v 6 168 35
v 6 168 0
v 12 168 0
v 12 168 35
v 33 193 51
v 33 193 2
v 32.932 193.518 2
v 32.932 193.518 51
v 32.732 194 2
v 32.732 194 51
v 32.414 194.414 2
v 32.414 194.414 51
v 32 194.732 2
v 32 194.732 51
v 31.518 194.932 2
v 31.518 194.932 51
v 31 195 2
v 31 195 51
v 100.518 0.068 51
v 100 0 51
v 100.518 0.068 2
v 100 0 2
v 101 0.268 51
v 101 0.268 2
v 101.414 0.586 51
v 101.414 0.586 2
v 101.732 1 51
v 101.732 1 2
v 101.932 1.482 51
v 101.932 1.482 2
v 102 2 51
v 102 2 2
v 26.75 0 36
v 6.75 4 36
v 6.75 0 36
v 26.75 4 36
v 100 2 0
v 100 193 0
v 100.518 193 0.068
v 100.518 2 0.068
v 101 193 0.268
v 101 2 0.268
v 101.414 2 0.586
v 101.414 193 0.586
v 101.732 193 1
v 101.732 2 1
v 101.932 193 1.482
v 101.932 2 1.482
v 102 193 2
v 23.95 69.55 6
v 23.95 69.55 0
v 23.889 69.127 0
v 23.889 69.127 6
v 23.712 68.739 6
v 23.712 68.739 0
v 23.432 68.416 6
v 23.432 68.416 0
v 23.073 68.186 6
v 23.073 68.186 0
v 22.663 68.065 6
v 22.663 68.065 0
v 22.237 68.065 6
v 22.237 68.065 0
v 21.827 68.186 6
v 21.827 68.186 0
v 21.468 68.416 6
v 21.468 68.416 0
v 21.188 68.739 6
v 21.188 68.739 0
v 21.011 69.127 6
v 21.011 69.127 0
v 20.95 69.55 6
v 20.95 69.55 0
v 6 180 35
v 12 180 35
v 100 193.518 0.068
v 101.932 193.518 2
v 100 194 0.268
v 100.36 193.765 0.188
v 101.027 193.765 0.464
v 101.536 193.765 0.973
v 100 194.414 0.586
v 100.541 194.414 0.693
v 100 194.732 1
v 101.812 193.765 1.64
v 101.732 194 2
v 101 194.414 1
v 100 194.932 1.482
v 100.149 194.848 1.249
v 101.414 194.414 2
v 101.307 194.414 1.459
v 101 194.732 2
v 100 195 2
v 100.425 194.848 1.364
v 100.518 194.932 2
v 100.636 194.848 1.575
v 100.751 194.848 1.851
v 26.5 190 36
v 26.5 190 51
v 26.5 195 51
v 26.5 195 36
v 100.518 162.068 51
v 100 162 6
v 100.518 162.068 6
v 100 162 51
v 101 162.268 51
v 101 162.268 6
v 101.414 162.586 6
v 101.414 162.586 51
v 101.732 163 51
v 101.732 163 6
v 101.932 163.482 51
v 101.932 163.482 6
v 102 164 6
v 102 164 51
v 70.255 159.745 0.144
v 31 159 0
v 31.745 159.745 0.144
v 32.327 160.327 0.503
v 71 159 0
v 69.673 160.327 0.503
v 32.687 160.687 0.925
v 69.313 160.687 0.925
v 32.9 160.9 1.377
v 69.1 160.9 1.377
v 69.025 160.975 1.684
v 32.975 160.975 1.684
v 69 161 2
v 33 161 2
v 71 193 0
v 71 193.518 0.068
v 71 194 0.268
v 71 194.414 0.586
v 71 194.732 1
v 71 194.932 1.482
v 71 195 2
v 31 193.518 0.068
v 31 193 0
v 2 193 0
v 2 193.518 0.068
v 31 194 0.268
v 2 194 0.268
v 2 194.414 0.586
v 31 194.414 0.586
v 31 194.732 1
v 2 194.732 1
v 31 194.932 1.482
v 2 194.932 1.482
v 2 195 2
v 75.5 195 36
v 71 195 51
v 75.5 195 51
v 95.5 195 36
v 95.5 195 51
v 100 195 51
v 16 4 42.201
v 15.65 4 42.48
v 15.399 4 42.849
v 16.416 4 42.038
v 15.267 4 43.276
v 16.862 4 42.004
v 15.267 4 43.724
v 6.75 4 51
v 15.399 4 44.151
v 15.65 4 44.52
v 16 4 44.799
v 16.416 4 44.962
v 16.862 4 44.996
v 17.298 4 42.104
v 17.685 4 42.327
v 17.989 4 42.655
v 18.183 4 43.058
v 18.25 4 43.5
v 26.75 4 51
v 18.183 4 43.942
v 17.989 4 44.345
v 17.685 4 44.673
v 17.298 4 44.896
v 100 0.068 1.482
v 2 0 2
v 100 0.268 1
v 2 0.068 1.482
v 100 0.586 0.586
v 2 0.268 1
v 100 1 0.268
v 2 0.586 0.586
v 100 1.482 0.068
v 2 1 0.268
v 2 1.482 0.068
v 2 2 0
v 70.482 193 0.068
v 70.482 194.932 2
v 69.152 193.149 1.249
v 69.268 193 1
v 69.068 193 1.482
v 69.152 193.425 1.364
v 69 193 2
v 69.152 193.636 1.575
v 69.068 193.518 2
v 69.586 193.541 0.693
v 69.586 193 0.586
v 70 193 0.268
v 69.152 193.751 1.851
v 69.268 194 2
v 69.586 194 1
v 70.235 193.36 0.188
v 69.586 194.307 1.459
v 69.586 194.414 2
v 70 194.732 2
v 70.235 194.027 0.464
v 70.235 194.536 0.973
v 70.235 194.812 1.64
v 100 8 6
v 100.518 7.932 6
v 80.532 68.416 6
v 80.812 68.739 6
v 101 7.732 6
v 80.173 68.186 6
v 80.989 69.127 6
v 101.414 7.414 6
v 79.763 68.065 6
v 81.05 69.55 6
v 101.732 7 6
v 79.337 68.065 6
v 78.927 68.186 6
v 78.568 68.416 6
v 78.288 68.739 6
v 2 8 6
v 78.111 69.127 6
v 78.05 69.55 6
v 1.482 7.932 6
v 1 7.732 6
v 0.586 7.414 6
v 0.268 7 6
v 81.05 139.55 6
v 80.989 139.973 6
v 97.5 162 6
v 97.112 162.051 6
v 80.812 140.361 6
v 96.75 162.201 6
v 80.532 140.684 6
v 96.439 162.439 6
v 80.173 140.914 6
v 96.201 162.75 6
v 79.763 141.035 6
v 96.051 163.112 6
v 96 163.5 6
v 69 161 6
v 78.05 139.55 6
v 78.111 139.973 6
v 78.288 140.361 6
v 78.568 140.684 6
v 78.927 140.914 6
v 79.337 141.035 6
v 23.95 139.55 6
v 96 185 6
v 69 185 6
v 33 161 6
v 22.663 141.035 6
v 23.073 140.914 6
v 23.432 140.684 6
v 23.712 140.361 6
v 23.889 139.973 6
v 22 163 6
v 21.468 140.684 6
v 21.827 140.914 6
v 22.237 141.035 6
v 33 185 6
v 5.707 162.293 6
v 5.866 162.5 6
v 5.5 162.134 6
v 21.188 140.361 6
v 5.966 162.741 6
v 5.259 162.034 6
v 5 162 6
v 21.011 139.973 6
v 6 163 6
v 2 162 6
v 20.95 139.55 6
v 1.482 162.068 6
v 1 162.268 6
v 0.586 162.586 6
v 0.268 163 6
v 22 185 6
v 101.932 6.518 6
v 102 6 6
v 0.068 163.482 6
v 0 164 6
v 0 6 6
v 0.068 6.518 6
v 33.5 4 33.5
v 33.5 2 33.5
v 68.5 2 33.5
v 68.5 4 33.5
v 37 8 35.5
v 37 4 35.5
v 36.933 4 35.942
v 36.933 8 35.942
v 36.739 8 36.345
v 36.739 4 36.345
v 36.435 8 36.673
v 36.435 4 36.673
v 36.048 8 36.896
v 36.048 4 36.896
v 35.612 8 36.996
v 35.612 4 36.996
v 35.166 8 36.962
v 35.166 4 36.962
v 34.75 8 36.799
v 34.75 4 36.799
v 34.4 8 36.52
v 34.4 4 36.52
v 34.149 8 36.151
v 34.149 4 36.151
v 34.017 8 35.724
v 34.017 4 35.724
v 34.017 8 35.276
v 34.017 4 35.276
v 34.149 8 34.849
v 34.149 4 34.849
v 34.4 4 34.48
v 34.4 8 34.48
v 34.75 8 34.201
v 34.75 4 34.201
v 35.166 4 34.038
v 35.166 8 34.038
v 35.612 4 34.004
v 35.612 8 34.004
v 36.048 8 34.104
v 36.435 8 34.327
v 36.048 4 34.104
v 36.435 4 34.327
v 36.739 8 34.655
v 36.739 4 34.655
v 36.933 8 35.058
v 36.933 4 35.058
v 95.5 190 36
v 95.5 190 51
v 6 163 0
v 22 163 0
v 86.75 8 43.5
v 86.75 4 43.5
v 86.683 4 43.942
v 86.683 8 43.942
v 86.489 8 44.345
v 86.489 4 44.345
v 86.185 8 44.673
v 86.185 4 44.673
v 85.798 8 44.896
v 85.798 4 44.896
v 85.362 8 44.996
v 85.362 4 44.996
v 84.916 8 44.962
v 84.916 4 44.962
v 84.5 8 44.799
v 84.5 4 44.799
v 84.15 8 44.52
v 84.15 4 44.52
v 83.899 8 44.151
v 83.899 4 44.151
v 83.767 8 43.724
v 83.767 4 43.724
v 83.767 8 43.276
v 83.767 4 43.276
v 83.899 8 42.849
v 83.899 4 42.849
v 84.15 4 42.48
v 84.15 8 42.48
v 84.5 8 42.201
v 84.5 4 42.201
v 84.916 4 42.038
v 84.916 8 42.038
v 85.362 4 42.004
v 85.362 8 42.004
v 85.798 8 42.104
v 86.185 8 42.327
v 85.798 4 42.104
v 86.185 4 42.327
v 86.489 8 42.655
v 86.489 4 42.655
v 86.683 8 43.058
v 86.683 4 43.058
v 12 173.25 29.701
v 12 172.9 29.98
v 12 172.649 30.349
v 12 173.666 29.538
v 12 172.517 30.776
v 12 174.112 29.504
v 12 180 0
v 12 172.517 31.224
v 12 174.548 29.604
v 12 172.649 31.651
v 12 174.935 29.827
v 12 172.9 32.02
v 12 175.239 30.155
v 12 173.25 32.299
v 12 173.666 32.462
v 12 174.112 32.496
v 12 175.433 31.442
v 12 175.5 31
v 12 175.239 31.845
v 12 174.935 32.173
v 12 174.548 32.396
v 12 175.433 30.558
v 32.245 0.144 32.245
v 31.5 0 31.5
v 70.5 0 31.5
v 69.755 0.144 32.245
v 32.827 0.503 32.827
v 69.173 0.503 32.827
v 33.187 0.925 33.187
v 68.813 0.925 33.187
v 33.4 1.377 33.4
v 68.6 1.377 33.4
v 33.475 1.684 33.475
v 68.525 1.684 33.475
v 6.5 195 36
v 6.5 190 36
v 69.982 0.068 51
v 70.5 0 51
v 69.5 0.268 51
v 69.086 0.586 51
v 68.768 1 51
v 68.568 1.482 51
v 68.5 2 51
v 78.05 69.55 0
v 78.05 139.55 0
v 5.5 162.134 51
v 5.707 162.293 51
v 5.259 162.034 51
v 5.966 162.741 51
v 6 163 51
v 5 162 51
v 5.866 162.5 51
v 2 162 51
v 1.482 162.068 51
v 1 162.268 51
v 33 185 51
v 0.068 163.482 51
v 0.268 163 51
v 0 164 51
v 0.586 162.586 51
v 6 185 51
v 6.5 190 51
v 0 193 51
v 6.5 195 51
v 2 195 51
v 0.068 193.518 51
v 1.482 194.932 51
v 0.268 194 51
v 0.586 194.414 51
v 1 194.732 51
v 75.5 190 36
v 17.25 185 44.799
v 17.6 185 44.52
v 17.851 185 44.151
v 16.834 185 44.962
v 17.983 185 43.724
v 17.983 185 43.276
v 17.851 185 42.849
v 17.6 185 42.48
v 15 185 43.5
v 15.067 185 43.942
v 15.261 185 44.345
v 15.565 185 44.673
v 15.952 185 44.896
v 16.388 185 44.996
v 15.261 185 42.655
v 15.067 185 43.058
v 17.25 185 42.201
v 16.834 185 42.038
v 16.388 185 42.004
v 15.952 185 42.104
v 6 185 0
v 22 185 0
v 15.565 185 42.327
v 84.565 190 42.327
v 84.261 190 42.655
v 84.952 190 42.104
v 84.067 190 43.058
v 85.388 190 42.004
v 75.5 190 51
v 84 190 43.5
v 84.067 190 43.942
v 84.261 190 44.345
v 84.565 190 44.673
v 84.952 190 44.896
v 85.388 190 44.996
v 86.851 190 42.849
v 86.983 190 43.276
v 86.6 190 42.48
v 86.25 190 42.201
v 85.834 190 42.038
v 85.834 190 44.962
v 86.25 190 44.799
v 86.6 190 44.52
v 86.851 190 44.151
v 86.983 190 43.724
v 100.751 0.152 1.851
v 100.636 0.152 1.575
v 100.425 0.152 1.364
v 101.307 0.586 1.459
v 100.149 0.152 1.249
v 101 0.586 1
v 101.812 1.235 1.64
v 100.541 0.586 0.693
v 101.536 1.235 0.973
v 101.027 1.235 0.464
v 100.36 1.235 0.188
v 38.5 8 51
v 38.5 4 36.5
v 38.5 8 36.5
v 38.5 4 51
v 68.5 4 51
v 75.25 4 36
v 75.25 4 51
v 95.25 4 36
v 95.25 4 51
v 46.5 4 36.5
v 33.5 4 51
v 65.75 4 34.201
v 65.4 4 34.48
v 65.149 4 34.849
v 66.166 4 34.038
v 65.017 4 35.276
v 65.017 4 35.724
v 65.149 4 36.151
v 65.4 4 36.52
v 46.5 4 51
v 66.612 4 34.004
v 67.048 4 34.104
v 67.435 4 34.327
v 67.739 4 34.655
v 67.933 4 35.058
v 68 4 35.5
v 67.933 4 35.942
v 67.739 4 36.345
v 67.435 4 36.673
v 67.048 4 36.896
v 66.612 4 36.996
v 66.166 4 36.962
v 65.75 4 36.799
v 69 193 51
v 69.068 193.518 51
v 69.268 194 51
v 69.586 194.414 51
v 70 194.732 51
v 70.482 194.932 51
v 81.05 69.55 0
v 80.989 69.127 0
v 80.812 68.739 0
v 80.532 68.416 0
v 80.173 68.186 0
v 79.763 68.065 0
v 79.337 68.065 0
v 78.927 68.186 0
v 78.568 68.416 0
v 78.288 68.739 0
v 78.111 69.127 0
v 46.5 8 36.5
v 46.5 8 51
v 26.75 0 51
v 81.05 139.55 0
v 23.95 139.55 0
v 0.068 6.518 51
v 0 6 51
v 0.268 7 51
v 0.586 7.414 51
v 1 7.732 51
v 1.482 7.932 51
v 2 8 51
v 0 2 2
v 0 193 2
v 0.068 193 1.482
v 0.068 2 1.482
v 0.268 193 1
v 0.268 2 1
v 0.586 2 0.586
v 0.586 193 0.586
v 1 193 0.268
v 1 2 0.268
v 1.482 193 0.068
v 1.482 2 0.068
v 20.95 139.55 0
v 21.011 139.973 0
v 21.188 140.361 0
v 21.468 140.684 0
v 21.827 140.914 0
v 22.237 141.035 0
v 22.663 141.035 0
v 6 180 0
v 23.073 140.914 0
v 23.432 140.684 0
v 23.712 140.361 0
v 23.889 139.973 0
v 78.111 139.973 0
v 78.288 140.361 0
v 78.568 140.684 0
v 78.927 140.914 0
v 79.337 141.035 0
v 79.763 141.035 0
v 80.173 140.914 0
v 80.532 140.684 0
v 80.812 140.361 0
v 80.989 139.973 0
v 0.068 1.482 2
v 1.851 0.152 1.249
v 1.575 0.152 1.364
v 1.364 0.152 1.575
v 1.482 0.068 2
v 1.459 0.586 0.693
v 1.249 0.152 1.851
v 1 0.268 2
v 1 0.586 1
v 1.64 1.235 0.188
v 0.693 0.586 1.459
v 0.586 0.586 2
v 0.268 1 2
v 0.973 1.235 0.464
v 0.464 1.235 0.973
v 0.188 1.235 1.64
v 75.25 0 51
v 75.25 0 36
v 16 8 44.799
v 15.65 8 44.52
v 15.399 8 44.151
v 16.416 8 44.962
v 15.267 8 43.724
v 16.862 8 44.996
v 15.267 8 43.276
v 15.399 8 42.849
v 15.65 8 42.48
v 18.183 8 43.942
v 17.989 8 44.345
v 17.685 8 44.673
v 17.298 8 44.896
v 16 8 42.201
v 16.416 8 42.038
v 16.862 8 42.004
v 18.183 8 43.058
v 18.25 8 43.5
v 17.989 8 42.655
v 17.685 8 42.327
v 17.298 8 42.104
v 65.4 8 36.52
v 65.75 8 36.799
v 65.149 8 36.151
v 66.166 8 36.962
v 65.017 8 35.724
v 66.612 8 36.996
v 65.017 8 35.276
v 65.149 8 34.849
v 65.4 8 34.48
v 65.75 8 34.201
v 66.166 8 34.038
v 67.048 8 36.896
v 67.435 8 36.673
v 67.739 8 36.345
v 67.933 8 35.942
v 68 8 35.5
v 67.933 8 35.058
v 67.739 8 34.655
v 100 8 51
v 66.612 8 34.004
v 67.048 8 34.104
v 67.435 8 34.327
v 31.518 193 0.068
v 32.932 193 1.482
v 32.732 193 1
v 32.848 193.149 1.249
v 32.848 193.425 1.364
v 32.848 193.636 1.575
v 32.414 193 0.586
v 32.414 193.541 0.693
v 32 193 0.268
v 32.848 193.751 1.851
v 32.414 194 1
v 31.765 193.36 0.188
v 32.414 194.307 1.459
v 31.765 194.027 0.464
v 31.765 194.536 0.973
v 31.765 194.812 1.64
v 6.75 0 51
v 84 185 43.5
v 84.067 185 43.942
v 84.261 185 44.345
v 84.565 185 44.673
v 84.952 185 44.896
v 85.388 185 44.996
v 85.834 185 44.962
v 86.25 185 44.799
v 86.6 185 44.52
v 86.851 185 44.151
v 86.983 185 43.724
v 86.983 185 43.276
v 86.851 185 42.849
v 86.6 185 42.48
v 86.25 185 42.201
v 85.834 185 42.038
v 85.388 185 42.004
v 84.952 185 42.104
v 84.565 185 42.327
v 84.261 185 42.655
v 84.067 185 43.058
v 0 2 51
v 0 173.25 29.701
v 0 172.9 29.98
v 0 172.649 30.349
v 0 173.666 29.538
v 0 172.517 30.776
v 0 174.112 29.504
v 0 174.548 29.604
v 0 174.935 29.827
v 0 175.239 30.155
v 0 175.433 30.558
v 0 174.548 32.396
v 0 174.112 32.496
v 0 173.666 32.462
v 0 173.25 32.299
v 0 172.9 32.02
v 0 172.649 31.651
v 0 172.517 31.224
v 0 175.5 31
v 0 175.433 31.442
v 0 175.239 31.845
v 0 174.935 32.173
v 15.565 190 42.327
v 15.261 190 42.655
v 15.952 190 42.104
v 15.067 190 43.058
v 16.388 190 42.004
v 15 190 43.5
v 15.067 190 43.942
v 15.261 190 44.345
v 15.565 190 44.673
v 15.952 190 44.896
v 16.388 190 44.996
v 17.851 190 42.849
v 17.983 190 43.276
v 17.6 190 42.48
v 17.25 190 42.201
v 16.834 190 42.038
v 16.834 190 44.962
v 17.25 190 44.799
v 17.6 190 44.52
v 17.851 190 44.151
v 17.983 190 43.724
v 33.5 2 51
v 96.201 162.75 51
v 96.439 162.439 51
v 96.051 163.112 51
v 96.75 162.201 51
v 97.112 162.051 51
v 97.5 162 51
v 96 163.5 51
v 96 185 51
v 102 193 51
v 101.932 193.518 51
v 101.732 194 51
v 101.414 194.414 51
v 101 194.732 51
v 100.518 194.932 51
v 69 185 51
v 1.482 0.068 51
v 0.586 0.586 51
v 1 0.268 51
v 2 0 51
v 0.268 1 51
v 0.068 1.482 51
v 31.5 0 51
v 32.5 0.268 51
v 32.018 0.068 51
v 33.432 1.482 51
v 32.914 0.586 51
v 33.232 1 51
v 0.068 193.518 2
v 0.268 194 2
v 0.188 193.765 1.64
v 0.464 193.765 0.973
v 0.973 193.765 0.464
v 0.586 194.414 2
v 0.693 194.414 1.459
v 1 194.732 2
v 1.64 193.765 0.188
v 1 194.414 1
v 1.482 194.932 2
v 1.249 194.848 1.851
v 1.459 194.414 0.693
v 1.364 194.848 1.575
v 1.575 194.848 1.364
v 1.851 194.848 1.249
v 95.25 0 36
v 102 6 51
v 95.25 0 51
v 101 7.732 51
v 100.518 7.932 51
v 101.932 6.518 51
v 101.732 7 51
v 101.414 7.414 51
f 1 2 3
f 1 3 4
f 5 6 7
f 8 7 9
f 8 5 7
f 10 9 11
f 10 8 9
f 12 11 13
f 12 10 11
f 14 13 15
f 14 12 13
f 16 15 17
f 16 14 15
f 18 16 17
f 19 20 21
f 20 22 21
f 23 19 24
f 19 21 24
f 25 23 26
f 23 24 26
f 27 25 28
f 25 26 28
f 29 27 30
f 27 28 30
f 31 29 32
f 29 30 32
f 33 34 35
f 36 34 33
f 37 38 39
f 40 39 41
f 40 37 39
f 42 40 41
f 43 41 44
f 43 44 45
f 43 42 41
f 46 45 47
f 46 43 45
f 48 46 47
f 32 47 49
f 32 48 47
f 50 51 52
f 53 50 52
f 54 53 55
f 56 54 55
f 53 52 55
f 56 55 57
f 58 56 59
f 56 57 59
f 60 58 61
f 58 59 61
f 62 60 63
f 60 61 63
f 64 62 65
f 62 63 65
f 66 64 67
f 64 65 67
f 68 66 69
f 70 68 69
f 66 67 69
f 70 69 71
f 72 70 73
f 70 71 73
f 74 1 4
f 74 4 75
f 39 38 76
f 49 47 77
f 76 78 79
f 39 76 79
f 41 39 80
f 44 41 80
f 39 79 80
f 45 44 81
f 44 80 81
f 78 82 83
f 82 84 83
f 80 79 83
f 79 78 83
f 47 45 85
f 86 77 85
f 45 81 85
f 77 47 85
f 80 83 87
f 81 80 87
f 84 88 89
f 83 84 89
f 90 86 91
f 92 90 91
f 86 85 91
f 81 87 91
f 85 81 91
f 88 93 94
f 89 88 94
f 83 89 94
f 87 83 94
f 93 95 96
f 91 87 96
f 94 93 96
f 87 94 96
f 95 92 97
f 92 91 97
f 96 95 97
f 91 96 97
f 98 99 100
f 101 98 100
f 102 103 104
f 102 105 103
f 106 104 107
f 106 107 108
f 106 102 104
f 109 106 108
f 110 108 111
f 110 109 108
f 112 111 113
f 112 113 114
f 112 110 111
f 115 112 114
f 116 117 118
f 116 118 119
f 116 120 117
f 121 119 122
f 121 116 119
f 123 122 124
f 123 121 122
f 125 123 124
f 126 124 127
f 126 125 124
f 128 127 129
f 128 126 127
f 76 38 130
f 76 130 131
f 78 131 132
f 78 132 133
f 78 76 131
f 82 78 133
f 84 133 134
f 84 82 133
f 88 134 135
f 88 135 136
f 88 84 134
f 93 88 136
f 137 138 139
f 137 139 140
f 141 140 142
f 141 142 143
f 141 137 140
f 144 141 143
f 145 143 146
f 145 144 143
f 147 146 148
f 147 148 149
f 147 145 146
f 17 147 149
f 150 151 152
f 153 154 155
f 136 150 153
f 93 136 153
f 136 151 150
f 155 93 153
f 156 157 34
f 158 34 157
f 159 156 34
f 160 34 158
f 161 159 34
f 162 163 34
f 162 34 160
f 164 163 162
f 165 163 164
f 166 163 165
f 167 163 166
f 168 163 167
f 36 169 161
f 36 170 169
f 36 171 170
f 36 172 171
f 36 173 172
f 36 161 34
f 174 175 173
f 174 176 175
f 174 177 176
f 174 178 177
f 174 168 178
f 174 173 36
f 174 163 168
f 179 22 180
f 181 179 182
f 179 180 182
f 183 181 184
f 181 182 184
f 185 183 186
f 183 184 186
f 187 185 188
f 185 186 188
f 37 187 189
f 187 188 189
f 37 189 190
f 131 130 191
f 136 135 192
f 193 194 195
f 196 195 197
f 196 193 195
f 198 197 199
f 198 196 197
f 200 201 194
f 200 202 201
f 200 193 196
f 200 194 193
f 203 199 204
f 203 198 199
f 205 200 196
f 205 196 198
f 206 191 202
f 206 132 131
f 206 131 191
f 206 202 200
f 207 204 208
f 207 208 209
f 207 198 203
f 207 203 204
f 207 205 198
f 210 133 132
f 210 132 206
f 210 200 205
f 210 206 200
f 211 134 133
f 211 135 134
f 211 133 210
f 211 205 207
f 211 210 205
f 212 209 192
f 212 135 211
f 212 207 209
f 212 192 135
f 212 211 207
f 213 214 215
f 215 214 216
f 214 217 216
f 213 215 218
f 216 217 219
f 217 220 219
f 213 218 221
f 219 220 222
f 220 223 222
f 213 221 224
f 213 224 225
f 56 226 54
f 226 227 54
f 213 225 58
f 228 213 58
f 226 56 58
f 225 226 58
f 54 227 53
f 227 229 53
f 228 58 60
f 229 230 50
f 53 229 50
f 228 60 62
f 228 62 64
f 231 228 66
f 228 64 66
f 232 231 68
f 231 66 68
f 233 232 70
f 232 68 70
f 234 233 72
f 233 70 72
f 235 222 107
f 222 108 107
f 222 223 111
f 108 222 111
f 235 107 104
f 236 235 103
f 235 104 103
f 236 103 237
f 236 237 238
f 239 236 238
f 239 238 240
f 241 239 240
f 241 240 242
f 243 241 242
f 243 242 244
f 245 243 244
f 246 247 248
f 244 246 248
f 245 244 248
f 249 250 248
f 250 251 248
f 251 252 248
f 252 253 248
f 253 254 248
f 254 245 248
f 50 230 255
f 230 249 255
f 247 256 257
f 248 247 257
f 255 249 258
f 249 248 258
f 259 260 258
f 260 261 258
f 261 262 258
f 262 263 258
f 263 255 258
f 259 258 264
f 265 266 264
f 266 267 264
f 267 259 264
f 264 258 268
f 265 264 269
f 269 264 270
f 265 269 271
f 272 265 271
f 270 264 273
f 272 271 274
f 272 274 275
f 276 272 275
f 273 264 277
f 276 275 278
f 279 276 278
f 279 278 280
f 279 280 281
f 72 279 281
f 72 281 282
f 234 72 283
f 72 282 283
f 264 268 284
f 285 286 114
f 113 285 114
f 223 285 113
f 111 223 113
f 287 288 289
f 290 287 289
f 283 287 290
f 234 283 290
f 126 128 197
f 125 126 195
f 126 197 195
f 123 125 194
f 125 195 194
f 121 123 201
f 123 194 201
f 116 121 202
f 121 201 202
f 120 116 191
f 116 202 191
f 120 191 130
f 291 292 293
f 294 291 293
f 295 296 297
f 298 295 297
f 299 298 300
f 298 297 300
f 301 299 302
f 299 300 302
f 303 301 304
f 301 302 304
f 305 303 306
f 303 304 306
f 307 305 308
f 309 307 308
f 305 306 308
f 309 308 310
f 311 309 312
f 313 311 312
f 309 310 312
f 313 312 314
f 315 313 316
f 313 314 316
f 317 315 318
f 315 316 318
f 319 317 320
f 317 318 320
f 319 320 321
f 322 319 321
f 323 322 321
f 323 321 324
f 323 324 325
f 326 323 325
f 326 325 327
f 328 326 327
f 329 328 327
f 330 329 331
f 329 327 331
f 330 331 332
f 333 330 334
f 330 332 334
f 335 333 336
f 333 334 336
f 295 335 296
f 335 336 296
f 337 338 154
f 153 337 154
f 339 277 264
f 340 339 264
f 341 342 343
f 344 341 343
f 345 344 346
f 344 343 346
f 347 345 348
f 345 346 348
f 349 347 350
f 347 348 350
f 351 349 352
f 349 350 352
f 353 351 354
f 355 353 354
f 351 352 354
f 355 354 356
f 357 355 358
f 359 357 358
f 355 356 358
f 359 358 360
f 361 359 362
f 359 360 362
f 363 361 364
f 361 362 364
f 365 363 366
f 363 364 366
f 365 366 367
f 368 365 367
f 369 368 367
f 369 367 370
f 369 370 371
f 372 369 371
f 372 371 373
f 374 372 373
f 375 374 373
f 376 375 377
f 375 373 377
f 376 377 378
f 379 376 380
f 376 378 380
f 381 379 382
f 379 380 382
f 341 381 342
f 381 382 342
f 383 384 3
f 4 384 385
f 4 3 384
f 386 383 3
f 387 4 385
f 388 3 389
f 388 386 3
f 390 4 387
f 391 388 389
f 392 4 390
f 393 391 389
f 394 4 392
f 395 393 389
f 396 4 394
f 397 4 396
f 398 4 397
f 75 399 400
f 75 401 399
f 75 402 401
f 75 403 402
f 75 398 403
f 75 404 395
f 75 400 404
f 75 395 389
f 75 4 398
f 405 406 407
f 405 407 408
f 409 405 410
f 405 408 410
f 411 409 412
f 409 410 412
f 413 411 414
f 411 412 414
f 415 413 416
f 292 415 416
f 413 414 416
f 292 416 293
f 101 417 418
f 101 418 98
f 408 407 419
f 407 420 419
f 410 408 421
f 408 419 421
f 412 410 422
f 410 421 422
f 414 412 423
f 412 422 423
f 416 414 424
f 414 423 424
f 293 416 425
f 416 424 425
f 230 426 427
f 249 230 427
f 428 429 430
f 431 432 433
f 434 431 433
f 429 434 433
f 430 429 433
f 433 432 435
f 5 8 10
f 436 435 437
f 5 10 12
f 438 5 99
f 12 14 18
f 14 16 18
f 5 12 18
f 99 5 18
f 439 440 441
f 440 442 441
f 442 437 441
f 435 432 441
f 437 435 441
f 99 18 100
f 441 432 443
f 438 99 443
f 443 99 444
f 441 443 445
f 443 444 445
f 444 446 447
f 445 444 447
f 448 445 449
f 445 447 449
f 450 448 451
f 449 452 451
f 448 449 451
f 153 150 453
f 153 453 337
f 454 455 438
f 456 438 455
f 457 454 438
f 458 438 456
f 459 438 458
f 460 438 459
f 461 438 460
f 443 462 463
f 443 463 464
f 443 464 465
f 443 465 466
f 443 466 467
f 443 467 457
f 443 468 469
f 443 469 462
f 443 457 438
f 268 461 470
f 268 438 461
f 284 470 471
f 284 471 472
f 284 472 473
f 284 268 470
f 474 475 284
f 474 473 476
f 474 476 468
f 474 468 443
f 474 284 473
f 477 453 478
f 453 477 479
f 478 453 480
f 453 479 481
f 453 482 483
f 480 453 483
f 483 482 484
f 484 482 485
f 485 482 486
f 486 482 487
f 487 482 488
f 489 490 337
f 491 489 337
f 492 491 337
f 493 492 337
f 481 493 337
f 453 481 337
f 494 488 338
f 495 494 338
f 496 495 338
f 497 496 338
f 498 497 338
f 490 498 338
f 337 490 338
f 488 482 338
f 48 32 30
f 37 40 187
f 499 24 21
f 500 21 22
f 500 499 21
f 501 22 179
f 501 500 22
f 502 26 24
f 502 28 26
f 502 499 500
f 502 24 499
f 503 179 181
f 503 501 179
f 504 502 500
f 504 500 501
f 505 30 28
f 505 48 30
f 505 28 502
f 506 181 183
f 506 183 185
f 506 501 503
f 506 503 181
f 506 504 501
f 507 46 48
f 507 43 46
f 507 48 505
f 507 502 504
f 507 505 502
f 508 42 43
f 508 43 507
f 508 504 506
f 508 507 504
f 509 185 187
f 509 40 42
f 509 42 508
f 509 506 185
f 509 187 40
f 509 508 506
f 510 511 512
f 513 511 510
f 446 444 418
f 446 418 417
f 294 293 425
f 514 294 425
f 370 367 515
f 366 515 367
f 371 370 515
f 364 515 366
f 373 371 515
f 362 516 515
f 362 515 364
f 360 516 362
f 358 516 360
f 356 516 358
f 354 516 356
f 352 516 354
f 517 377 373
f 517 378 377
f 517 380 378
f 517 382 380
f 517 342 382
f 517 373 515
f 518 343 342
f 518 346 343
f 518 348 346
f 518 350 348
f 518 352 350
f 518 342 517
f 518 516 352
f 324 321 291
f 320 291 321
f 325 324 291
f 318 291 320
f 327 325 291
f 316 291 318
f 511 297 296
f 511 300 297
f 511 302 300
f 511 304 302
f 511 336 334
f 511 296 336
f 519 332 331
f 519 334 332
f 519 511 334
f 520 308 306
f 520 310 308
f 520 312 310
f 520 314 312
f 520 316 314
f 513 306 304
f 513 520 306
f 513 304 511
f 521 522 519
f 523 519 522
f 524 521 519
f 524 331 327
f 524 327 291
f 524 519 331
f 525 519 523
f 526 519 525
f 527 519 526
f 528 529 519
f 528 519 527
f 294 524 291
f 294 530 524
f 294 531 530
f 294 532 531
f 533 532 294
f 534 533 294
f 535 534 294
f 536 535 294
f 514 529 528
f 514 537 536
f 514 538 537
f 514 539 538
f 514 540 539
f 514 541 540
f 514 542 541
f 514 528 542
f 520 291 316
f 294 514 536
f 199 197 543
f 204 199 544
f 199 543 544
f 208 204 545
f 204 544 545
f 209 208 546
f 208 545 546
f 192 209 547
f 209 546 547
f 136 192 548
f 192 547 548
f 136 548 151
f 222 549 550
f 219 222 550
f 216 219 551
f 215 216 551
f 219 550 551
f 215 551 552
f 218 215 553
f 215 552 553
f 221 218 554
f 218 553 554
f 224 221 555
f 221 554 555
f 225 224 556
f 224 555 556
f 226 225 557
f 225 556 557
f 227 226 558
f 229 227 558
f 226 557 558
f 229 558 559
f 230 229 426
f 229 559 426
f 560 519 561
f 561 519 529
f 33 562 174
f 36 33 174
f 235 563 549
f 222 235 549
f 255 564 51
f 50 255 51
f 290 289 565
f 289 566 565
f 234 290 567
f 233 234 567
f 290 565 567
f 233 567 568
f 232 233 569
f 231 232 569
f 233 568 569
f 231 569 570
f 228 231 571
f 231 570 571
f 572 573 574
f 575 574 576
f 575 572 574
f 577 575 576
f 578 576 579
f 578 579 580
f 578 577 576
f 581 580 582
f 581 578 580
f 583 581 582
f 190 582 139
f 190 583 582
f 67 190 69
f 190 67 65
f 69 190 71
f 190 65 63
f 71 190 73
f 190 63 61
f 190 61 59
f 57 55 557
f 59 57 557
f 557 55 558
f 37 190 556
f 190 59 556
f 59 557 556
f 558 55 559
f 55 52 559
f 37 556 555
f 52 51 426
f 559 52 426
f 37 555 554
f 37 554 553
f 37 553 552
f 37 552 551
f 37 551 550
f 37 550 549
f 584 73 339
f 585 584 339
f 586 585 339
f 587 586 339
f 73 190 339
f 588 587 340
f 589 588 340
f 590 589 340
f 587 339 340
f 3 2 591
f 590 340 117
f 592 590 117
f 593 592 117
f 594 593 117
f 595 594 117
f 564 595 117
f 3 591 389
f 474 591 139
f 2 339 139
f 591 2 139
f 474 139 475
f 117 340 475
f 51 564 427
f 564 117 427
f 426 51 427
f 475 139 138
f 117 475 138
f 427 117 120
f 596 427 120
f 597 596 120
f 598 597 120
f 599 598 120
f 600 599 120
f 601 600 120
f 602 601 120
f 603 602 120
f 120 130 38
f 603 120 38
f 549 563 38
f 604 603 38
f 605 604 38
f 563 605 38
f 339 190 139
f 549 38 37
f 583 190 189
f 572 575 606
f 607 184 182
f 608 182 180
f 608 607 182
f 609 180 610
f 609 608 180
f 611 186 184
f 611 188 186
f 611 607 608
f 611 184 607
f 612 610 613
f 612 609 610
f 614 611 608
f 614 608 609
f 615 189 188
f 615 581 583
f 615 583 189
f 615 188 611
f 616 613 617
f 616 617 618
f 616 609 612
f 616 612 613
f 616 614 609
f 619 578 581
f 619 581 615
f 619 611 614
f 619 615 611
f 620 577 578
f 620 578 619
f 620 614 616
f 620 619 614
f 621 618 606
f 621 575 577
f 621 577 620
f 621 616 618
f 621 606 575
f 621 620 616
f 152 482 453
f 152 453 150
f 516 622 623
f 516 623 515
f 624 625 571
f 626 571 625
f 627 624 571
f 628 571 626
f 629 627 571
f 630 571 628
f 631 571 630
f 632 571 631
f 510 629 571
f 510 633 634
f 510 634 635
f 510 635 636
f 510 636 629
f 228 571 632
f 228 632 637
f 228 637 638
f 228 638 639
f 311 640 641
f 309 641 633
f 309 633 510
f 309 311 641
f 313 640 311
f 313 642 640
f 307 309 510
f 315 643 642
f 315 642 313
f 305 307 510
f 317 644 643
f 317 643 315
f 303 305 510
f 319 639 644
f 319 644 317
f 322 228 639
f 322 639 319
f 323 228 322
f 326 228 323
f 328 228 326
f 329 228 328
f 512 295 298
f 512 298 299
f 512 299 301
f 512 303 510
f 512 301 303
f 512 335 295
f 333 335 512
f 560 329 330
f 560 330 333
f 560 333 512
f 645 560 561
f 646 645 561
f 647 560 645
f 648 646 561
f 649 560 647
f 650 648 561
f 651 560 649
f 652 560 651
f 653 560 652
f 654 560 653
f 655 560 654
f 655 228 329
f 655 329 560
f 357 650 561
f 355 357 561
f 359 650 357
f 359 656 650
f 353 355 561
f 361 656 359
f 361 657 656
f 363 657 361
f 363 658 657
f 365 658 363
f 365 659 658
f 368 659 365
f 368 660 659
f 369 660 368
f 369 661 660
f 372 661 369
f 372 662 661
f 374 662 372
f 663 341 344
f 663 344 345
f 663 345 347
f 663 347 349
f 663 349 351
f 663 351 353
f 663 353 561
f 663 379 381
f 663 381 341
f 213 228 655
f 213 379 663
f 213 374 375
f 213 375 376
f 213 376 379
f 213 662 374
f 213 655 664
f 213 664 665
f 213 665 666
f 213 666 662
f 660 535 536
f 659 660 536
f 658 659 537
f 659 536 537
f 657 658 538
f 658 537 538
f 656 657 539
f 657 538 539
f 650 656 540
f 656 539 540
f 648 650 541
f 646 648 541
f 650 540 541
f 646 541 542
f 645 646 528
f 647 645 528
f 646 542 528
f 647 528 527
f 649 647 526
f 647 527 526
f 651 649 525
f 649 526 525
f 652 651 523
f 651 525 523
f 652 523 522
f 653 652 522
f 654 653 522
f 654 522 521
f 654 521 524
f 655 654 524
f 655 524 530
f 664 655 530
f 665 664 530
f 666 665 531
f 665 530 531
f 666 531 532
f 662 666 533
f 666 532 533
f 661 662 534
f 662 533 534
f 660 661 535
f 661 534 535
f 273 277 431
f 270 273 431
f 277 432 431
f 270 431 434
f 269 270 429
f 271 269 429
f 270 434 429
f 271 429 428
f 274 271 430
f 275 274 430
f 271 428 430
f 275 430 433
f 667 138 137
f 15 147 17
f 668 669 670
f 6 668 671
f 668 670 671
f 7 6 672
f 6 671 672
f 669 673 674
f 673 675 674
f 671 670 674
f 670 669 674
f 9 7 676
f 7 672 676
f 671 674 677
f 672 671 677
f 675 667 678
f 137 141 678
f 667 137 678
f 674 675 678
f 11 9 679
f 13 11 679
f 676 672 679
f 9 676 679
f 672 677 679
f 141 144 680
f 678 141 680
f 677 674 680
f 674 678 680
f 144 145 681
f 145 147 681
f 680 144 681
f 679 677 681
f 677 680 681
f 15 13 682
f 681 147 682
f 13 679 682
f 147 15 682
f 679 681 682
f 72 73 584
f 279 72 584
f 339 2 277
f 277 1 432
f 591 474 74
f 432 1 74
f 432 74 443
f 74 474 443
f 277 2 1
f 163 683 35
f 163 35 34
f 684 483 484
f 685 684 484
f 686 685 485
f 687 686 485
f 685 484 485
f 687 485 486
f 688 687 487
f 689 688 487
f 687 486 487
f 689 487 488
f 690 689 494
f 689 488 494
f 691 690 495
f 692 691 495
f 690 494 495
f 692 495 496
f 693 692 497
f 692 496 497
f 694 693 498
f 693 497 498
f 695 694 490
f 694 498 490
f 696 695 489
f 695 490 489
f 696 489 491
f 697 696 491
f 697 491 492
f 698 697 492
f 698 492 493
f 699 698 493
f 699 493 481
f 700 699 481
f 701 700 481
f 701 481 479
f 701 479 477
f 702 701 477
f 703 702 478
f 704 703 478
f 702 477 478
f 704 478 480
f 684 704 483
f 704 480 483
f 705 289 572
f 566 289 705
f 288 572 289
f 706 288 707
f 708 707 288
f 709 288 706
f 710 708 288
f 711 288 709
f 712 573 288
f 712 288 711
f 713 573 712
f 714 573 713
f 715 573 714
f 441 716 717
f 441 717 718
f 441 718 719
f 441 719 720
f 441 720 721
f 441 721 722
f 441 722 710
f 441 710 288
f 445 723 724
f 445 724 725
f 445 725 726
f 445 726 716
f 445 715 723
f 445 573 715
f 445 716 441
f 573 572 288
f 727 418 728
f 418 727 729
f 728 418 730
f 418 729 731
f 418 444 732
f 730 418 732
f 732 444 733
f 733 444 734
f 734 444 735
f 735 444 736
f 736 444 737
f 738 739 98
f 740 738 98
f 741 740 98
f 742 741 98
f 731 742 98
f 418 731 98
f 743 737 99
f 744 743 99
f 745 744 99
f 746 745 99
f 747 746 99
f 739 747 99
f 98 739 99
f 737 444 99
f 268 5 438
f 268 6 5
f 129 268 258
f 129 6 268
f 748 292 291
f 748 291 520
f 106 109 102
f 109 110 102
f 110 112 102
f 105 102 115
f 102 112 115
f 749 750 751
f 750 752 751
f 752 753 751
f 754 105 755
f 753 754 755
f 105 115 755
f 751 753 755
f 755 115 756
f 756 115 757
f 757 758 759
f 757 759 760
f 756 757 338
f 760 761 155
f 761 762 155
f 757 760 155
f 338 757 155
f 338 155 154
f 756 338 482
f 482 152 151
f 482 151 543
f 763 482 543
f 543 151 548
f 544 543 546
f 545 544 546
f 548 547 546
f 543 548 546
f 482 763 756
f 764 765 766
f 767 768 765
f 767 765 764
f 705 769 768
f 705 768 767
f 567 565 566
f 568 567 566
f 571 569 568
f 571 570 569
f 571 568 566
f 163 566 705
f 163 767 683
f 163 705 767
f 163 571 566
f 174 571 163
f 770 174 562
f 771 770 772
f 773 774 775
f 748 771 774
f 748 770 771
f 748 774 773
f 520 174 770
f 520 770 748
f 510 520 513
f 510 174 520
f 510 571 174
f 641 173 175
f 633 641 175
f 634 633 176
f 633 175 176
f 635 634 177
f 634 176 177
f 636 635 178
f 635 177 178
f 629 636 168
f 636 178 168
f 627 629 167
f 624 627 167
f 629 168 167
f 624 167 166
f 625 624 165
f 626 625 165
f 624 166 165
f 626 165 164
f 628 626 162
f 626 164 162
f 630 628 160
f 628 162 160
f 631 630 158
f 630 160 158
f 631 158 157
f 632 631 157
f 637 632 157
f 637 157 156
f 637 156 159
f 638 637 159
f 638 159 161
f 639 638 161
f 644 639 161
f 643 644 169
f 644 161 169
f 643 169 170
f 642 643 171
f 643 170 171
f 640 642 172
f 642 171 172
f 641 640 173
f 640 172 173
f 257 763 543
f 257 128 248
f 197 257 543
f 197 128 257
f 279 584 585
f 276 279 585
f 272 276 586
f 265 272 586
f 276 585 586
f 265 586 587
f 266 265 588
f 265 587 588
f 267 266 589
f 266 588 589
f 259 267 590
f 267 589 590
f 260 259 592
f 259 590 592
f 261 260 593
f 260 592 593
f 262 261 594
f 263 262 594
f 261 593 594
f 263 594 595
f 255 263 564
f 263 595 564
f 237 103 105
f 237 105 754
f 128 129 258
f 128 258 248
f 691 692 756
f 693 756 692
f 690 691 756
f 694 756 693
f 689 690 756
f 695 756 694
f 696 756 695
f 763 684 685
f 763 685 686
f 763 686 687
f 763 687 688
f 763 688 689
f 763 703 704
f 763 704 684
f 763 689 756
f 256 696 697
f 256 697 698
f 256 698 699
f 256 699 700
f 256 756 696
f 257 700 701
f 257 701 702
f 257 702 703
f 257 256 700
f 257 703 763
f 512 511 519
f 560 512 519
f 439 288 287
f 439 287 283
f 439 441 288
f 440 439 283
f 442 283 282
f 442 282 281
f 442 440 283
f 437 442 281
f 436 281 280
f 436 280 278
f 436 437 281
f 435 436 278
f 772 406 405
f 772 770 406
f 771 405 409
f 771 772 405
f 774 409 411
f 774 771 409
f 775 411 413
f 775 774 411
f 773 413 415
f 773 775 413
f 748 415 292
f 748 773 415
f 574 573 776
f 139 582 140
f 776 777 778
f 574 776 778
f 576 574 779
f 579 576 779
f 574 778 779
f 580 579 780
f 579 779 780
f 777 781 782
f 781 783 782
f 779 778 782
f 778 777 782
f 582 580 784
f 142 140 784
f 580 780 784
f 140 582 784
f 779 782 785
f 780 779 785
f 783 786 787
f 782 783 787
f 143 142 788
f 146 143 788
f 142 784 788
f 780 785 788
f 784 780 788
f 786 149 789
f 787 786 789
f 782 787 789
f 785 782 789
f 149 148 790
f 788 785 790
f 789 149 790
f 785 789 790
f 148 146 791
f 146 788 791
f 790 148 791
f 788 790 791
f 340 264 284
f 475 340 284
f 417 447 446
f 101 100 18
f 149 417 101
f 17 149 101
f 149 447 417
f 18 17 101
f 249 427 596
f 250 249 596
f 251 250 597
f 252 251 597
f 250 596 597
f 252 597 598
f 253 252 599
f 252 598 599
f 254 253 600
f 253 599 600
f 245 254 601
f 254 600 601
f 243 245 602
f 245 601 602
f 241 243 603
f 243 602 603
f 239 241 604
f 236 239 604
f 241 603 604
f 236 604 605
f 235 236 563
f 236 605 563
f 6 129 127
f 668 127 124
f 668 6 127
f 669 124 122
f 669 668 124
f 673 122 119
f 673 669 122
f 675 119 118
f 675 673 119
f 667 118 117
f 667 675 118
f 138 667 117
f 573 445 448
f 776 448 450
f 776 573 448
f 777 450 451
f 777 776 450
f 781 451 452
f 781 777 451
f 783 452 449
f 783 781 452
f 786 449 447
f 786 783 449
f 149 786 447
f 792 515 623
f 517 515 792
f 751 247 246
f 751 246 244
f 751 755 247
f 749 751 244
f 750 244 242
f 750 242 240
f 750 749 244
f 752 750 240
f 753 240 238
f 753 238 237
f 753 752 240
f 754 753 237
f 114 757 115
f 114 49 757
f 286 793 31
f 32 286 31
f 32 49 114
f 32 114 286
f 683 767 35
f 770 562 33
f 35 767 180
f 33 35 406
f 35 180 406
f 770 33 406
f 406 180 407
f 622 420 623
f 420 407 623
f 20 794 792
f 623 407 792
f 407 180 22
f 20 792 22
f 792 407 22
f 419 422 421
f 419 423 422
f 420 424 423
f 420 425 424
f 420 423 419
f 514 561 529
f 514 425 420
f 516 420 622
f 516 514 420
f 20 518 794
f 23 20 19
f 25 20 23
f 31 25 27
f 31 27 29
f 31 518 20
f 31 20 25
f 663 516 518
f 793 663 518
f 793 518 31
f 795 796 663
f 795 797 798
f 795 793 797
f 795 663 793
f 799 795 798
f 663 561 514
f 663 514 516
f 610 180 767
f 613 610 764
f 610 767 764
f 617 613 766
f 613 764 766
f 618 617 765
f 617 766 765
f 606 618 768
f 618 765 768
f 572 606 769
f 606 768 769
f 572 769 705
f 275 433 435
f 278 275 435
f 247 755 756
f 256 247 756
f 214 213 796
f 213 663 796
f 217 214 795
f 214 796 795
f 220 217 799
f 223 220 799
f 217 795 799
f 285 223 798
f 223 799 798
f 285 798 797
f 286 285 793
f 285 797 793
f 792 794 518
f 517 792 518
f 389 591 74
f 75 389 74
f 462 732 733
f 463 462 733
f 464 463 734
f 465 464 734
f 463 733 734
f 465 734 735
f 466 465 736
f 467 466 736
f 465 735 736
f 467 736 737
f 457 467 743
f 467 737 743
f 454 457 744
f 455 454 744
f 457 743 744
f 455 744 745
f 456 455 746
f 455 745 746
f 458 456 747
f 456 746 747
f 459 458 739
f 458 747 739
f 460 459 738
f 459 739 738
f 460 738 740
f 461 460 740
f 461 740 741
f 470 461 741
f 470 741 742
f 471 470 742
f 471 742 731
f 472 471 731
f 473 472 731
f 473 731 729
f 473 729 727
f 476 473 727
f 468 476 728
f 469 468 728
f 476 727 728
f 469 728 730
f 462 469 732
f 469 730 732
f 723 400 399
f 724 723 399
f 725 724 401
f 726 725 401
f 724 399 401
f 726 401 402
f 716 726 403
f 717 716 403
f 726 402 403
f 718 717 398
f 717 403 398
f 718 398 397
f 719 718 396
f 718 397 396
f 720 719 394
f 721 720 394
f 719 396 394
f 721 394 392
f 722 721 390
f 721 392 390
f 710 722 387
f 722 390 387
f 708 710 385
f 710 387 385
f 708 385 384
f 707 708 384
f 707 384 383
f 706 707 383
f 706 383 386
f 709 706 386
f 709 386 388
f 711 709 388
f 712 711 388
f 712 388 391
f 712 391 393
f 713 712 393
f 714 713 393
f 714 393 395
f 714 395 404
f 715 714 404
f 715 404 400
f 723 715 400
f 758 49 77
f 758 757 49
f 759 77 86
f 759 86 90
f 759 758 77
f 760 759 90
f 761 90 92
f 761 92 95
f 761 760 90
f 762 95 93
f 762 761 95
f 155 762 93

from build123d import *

# Parameters (mm, degrees)
PAD_DEPTH       = 6
SKETCH001_W     = 22
SKETCH001_H     = 22
POCKET_DEPTH    = 6
SKETCH002_W     = 102
SKETCH002_H     = 8
PAD001_DEPTH    = 45
SKETCH003_W     = 35
SKETCH003_H     = 17.5
POCKET001_DEPTH = 4
SKETCH004_R     = 1.5
SKETCH004_W     = 8
SKETCH004_H     = 14.5
POCKET002_DEPTH = 4
SKETCH005_W     = 20
SKETCH005_H     = 4
POCKET003_DEPTH = 15
SKETCH006_R     = 1.5
POCKET004_DEPTH = 4
PAD002_DEPTH    = 45
SKETCH008_W     = 6
SKETCH008_H     = 6
PAD003_DEPTH    = 22
SKETCH009_W     = 20
SKETCH009_H     = 5
POCKET005_DEPTH = 15
SKETCH010_R     = 1.5
POCKET006_DEPTH = 5
SKETCH011_W     = 12
SKETCH011_H     = 35
PAD004_DEPTH    = 6
SKETCH012_R     = 1.5
POCKET007_DEPTH = 12.001
POCKET008_DEPTH = 6
FILLET_R        = 2
FILLET001_R     = 2
FILLET002_R     = 2
FILLET003_R     = 2
FILLET004_R     = 2
FILLET005_R     = 2
FILLET006_R     = 2
FILLET007_R     = 1.5
FILLET008_R     = 2
FILLET009_R     = 1
FILLET010_R     = 2
FILLET011_R     = 2
FILLET012_R     = 2
FILLET013_R     = 2


with BuildPart() as part:
    # Sketch → Pad (new body)
    with BuildSketch(Plane.XY):
        Polygon((0, 0), (0, 195), (33, 195), (33, 161), (69, 161), (69, 195), (102, 195), (102, 0), align=None)
    extrude(amount=PAD_DEPTH)

    # Sketch001 (on Face10 of Pad) → Pocket (cut)
    with BuildSketch(Plane.XY.offset(6)):
        with Locations((11, 174)):
            Rectangle(SKETCH001_W, SKETCH001_H)
    extrude(amount=-POCKET_DEPTH, mode=Mode.SUBTRACT)

    # Sketch002 (on Face4 of Pocket) → Pad001 (join)
    with BuildSketch(Plane.XY.offset(6)):
        with Locations((51, 4)):
            Rectangle(SKETCH002_W, SKETCH002_H)
    extrude(amount=PAD001_DEPTH)

    # Sketch003 (on Face16 of Pad001) → Pocket001 (cut)
    with BuildSketch(Plane.XZ):
        with Locations((51, 42.25)):
            Rectangle(SKETCH003_W, SKETCH003_H)
    extrude(amount=-POCKET001_DEPTH, mode=Mode.SUBTRACT)

    # Sketch004 (on Face23 of Pocket001) → Pocket002 (cut)
    with BuildSketch(Plane.XZ.offset(-4)):
        with Locations((35.5, 35.5)):
            Circle(SKETCH004_R)
        with Locations((66.5, 35.5)):
            Circle(SKETCH004_R)
        with Locations((42.5, 43.75)):
            Rectangle(SKETCH004_W, SKETCH004_H)
    extrude(amount=-POCKET002_DEPTH, mode=Mode.SUBTRACT)

    # Sketch005 (on Face23 of Pocket002) → Pocket003 (cut)
    with BuildSketch(Plane.XY.offset(51)):
        with Locations((85.25, 2)):
            Rectangle(SKETCH005_W, SKETCH005_H)
        with Locations((16.75, 2)):
            Rectangle(SKETCH005_W, SKETCH005_H)
    extrude(amount=-POCKET003_DEPTH, mode=Mode.SUBTRACT)

    # Sketch006 (on Face36 of Pocket003) → Pocket004 (cut)
    with BuildSketch(Plane.XZ.offset(-4)):
        with Locations((16.75, 43.5)):
            Circle(SKETCH006_R)
        with Locations((85.25, 43.5)):
            Circle(SKETCH006_R)
    extrude(amount=-POCKET004_DEPTH, mode=Mode.SUBTRACT)

    # Sketch007 (on Face5 of Pocket004) → Pad002 (join)
    with BuildSketch(Plane.XY.offset(6)):
        Polygon((102, 162), (96, 162), (96, 185), (69, 185), (69, 195), (102, 195), align=None)
        Polygon((6, 162), (0, 162), (0, 195), (33, 195), (33, 185), (6, 185), align=None)
    extrude(amount=PAD002_DEPTH)

    # Sketch008 (on Face9 of Pad002) → Pad003 (join)
    with BuildSketch(Plane.XZ.offset(-185)):
        with Locations((3, 3)):
            Rectangle(SKETCH008_W, SKETCH008_H)
    extrude(amount=PAD003_DEPTH)

    # Sketch009 (on Face29 of Pad003) → Pocket005 (cut)
    with BuildSketch(Plane.XY.offset(51)):
        with Locations((16.5, 192.5)):
            Rectangle(SKETCH009_W, SKETCH009_H)
        with Locations((85.5, 192.5)):
            Rectangle(SKETCH009_W, SKETCH009_H)
    extrude(amount=-POCKET005_DEPTH, mode=Mode.SUBTRACT)

    # Sketch010 (on Face64 of Pocket005) → Pocket006 (cut)
    with BuildSketch(Plane(origin=(0, 190, 0), x_dir=(-1, 0, 0), z_dir=(0, 1, 0))):
        with Locations((-85.5, 43.5)):
            Circle(SKETCH010_R)
        with Locations((-16.5, 43.5)):
            Circle(SKETCH010_R)
    extrude(amount=-POCKET006_DEPTH, mode=Mode.SUBTRACT)

    # Sketch011 (on Face23 of Pocket006) → Pad004 (join)
    with BuildSketch(Plane.YZ.offset(6)):
        with Locations((174, 17.5)):
            Rectangle(SKETCH011_W, SKETCH011_H)
    extrude(amount=PAD004_DEPTH)

    # Sketch012 (on Face67 of Pad004) → Pocket007 (cut, through all)
    with BuildSketch(Plane.YZ.offset(12)):
        with Locations((174, 31)):
            Circle(SKETCH012_R)
    extrude(amount=-POCKET007_DEPTH, mode=Mode.SUBTRACT)

    # Sketch013 (on Face2 of Pocket007) → Pocket008 (cut)
    with BuildSketch(Plane(origin=(0, 0, 0), x_dir=(1, 0, 0), z_dir=(0, 0, -1))):
        with BuildLine():
            ThreePointArc((23.95, -69.55), (22.45, -68.05), (20.95, -69.55))
            Line((20.95, -69.55), (20.95, -139.55))
            ThreePointArc((20.95, -139.55), (22.45, -141.05), (23.95, -139.55))
            Line((23.95, -139.55), (23.95, -69.55))
        make_face()
        with BuildLine():
            ThreePointArc((81.05, -69.55), (79.55, -68.05), (78.05, -69.55))
            Line((78.05, -69.55), (78.05, -139.55))
            ThreePointArc((78.05, -139.55), (79.55, -141.05), (81.05, -139.55))
            Line((81.05, -139.55), (81.05, -69.55))
        make_face()
    extrude(amount=-POCKET008_DEPTH, mode=Mode.SUBTRACT)

    # Fillet
    fillet_edges = [part.edges().sort_by_distance(p)[0] for p in [
        (0, 81.5, 0),
    ]]
    fillet(fillet_edges, radius=FILLET_R)

    # Fillet001
    fillet001_edges = [part.edges().sort_by_distance(p)[0] for p in [
        (102, 97.5, 0),
    ]]
    fillet(fillet001_edges, radius=FILLET001_R)

    # Fillet002
    fillet002_edges = [part.edges().sort_by_distance(p)[0] for p in [
        (51, 0, 0),
    ]]
    fillet(fillet002_edges, radius=FILLET002_R)

    # Fillet003
    fillet003_edges = [part.edges().sort_by_distance(p)[0] for p in [
        (51, 0, 33.5),
        (33.5, 0, 42.25),
        (68.5, 0, 42.25),
    ]]
    fillet(fillet003_edges, radius=FILLET003_R)

    # Fillet004
    fillet004_edges = [part.edges().sort_by_distance(p)[0] for p in [
        (102, 8, 28.5),
    ]]
    fillet(fillet004_edges, radius=FILLET004_R)

    # Fillet005
    fillet005_edges = [part.edges().sort_by_distance(p)[0] for p in [
        (0, 8, 28.5),
    ]]
    fillet(fillet005_edges, radius=FILLET005_R)

    # Fillet006
    fillet006_edges = [part.edges().sort_by_distance(p)[0] for p in [
        (102, 162, 28.5),
    ]]
    fillet(fillet006_edges, radius=FILLET006_R)

    # Fillet007
    fillet007_edges = [part.edges().sort_by_distance(p)[0] for p in [
        (96, 162, 28.5),
    ]]
    fillet(fillet007_edges, radius=FILLET007_R)

    # Fillet008
    fillet008_edges = [part.edges().sort_by_distance(p)[0] for p in [
        (0, 162, 28.5),
    ]]
    fillet(fillet008_edges, radius=FILLET008_R)

    # Fillet009
    fillet009_edges = [part.edges().sort_by_distance(p)[0] for p in [
        (6, 162, 28.5),
    ]]
    fillet(fillet009_edges, radius=FILLET009_R)

    # Fillet010
    fillet010_edges = [part.edges().sort_by_distance(p)[0] for p in [
        (0, 195, 28.5),
    ]]
    fillet(fillet010_edges, radius=FILLET010_R)

    # Fillet011
    fillet011_edges = [part.edges().sort_by_distance(p)[0] for p in [
        (102, 195, 28.5),
    ]]
    fillet(fillet011_edges, radius=FILLET011_R)

    # Fillet012
    fillet012_edges = [part.edges().sort_by_distance(p)[0] for p in [
        (33, 195, 28.5),
        (69, 195, 28.5),
    ]]
    fillet(fillet012_edges, radius=FILLET012_R)

    # Fillet013
    fillet013_edges = [part.edges().sort_by_distance(p)[0] for p in [
        (51, 161, 0),
    ]]
    fillet(fillet013_edges, radius=FILLET013_R)


solid = part.part
